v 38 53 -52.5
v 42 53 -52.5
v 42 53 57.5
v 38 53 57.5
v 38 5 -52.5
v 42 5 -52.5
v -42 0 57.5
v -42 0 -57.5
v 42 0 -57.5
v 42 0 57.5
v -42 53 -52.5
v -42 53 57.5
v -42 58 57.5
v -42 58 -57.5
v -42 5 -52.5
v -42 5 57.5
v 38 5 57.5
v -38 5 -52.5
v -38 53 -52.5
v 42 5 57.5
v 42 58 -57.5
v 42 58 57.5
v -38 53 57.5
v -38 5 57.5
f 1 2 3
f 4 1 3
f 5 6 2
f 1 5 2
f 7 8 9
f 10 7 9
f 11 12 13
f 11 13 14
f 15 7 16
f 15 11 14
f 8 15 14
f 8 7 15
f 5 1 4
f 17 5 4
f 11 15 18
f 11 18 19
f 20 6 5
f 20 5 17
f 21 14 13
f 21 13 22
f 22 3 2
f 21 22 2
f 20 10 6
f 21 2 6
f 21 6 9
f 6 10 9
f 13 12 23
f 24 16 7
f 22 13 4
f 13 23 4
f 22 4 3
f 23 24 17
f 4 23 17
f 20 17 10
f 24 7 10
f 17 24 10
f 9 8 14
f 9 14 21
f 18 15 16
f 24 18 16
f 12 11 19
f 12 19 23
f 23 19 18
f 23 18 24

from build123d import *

# Parameters (mm, degrees)
ESQUISSE1_W             = 84
ESQUISSE1_H             = 115
BOSS_EXTRU_1_DEPTH      = 58
ESQUISSE2_W             = 110
ESQUISSE2_H             = 48
ENL_V_MAT_EXTRU_1_DEPTH = 4


with BuildPart() as part:
    # Esquisse1 → Boss.-Extru.1 (new body)
    with BuildSketch(Plane(origin=(0, 0, 0), x_dir=(1, 0, 0), z_dir=(0, 1, 0))):
        Rectangle(ESQUISSE1_W, ESQUISSE1_H)
    extrude(amount=BOSS_EXTRU_1_DEPTH)

    # Esquisse2 → Enlèv. mat.-Extru.1 (cut)
    with BuildSketch(Plane.ZY.offset(42)):
        with Locations((2.5, 29)):
            Rectangle(ESQUISSE2_W, ESQUISSE2_H)
    enl_v_mat_extru_1 = extrude(amount=-ENL_V_MAT_EXTRU_1_DEPTH, mode=Mode.SUBTRACT)

    # Symétrie1: Enlèv. mat.-Extru.1 across plane
    add(enl_v_mat_extru_1.mirror(Plane(origin=(0, 0, 0), x_dir=(0, 0, 1), z_dir=(1, 0, 0))), mode=Mode.SUBTRACT)


solid = part.part
